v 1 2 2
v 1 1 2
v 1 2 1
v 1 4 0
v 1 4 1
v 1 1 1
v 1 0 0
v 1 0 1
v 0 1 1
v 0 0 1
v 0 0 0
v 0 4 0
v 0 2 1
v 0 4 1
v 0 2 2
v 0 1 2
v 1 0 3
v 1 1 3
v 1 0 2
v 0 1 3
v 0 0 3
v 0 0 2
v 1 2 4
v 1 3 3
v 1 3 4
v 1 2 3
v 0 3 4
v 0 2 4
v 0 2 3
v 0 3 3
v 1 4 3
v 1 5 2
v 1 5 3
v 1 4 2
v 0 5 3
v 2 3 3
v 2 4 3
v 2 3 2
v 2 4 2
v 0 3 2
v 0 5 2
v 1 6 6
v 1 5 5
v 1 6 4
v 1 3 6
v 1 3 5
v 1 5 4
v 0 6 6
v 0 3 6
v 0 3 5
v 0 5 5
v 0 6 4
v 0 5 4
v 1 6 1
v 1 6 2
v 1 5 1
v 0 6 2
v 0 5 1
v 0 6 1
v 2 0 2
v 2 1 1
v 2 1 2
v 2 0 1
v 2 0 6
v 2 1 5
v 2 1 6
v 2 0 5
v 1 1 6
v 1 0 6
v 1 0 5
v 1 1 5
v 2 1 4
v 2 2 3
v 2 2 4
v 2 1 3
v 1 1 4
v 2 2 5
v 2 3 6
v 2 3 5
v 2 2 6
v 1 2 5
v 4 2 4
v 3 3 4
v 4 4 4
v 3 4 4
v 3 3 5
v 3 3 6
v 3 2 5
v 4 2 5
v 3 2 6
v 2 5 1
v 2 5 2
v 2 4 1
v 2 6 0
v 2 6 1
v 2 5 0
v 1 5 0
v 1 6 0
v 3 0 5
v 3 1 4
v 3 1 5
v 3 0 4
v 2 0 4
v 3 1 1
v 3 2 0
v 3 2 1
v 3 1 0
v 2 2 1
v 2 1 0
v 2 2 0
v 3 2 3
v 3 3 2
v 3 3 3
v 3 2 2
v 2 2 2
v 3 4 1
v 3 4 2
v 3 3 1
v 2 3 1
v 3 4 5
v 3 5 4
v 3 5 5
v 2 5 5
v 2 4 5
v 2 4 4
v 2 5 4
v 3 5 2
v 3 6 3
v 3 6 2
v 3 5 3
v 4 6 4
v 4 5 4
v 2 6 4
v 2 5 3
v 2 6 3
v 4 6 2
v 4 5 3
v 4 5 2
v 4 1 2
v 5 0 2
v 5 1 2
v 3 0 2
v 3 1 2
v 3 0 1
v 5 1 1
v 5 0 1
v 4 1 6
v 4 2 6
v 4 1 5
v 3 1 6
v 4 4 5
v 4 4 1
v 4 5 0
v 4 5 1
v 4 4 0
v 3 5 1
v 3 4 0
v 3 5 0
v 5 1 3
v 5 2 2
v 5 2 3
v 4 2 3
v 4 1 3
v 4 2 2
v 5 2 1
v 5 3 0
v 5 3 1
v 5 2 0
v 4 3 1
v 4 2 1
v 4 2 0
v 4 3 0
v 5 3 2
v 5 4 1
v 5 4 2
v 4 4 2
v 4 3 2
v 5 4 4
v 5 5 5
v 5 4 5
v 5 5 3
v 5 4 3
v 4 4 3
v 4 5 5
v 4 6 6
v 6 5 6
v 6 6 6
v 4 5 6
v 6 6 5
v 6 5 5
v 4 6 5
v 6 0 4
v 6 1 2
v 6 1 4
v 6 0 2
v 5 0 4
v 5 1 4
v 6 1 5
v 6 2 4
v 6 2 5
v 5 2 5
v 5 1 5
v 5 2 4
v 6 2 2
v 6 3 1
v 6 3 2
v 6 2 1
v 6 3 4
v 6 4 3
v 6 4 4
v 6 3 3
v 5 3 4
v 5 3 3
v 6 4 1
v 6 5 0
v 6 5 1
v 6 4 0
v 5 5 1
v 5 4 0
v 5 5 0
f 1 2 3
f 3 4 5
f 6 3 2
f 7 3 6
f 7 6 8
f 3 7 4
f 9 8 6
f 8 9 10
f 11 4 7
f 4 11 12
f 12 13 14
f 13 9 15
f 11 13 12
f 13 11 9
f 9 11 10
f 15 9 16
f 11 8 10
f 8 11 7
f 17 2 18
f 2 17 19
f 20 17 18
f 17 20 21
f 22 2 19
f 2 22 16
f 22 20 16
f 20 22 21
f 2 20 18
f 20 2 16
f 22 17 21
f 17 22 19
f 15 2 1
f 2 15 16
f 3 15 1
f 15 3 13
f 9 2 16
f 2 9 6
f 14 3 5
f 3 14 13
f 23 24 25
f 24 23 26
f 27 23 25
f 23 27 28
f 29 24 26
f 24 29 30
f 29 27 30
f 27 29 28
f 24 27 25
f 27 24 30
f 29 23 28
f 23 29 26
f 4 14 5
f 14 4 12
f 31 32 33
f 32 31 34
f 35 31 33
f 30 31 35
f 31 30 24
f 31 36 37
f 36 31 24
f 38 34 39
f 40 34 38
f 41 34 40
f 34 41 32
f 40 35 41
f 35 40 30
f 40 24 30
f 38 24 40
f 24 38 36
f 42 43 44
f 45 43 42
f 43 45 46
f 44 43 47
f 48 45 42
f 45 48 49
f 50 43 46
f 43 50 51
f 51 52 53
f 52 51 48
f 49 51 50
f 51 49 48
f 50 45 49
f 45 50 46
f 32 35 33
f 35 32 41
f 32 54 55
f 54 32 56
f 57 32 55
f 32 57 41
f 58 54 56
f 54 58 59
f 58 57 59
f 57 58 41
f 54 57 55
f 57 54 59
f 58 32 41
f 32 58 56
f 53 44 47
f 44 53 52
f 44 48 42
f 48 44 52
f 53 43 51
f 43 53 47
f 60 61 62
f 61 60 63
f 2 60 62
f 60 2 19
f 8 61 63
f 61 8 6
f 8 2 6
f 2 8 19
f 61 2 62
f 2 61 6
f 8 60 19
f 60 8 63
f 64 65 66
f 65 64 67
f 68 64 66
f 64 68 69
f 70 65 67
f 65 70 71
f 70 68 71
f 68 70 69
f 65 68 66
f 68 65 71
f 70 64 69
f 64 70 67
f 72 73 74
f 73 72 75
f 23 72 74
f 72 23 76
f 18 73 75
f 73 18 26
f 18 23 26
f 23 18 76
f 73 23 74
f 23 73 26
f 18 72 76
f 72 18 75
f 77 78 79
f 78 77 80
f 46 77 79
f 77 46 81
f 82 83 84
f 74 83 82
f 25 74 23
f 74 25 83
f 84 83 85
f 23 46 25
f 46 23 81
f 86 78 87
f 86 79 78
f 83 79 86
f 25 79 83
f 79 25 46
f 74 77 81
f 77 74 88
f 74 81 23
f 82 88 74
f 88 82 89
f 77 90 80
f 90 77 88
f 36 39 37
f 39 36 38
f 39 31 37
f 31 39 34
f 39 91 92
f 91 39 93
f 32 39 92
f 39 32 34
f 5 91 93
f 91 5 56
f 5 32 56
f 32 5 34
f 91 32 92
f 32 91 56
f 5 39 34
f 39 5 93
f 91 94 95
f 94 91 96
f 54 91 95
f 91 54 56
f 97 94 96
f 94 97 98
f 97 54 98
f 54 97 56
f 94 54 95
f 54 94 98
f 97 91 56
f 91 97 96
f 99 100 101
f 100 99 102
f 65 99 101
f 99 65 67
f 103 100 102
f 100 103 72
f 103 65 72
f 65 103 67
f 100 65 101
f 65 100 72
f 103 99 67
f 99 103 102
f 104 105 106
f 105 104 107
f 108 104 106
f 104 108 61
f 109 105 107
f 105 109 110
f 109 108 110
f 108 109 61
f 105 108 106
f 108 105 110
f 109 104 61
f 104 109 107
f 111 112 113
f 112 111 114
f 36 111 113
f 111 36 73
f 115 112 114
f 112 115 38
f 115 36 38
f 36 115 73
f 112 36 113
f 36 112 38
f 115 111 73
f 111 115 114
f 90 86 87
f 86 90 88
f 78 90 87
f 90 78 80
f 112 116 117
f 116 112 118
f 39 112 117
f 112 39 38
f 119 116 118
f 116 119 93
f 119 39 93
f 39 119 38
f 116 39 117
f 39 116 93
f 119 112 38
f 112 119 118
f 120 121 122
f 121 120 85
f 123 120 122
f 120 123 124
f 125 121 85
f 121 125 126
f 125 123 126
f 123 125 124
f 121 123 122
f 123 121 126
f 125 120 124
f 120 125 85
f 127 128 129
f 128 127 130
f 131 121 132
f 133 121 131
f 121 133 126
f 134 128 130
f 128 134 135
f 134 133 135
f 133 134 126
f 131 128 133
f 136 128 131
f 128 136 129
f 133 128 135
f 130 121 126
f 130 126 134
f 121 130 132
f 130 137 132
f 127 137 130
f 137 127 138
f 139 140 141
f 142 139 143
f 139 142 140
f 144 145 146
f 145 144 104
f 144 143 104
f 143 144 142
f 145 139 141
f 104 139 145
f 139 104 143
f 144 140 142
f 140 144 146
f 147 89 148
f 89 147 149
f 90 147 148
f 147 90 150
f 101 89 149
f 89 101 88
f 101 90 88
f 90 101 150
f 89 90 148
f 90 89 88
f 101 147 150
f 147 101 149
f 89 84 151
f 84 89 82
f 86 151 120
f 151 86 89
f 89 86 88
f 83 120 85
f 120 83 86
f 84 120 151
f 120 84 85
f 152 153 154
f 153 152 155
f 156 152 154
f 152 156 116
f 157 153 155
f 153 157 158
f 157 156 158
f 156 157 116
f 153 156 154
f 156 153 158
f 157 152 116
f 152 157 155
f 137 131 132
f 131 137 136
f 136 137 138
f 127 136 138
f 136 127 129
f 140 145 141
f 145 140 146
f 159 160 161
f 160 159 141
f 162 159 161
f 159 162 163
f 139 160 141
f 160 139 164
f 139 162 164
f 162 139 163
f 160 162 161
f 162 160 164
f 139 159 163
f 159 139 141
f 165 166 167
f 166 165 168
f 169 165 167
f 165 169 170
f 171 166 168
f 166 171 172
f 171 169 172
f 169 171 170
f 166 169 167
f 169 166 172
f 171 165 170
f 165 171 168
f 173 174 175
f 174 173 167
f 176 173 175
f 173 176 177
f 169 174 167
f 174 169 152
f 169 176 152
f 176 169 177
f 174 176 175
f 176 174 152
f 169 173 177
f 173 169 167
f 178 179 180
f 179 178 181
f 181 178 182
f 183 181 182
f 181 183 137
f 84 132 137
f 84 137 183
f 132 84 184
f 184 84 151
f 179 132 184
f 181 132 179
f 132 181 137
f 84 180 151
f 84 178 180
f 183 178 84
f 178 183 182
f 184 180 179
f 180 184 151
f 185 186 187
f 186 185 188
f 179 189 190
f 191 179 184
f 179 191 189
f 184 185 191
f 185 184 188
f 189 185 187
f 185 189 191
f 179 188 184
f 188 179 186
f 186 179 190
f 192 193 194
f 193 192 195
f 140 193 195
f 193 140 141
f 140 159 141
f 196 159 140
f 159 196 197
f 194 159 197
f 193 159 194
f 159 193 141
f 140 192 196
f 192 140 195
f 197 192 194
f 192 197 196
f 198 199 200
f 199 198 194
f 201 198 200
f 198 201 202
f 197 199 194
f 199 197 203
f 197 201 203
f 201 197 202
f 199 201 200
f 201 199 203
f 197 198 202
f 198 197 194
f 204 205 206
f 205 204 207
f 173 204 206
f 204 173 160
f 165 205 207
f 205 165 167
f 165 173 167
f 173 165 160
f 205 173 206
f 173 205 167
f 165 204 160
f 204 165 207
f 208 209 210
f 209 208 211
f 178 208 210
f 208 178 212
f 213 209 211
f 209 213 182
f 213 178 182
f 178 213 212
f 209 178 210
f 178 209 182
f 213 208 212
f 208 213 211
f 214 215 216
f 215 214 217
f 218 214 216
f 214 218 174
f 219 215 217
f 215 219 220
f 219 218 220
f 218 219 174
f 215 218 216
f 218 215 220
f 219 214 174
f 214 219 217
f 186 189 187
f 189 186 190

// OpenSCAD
union() {
    translate([0, 0, 0]) cube([1, 1, 1]);
    translate([0, 0, 2]) cube([1, 1, 1]);
    translate([0, 1, 0]) cube([1, 1, 1]);
    translate([0, 1, 1]) cube([1, 1, 1]);
    translate([0, 2, 0]) cube([1, 1, 1]);
    translate([0, 2, 3]) cube([1, 1, 1]);
    translate([0, 3, 0]) cube([1, 1, 1]);
    translate([0, 3, 2]) cube([1, 1, 1]);
    translate([0, 3, 5]) cube([1, 1, 1]);
    translate([0, 4, 2]) cube([1, 1, 1]);
    translate([0, 4, 5]) cube([1, 1, 1]);
    translate([0, 5, 1]) cube([1, 1, 1]);
    translate([0, 5, 4]) cube([1, 1, 1]);
    translate([0, 5, 5]) cube([1, 1, 1]);
    translate([1, 0, 1]) cube([1, 1, 1]);
    translate([1, 0, 5]) cube([1, 1, 1]);
    translate([1, 1, 3]) cube([1, 1, 1]);
    translate([1, 2, 4]) cube([1, 1, 1]);
    translate([1, 3, 2]) cube([1, 1, 1]);
    translate([1, 4, 1]) cube([1, 1, 1]);
    translate([1, 5, 0]) cube([1, 1, 1]);
    translate([2, 0, 4]) cube([1, 1, 1]);
    translate([2, 1, 0]) cube([1, 1, 1]);
    translate([2, 2, 2]) cube([1, 1, 1]);
    translate([2, 2, 4]) cube([1, 1, 1]);
    translate([2, 2, 5]) cube([1, 1, 1]);
    translate([2, 3, 1]) cube([1, 1, 1]);
    translate([2, 4, 4]) cube([1, 1, 1]);
    translate([2, 5, 3]) cube([1, 1, 1]);
    translate([3, 0, 1]) cube([1, 1, 1]);
    translate([3, 1, 5]) cube([1, 1, 1]);
    translate([3, 2, 4]) cube([1, 1, 1]);
    translate([3, 3, 4]) cube([1, 1, 1]);
    translate([3, 4, 0]) cube([1, 1, 1]);
    translate([3, 5, 2]) cube([1, 1, 1]);
    translate([3, 5, 3]) cube([1, 1, 1]);
    translate([4, 0, 1]) cube([1, 1, 1]);
    translate([4, 1, 2]) cube([1, 1, 1]);
    translate([4, 2, 0]) cube([1, 1, 1]);
    translate([4, 3, 1]) cube([1, 1, 1]);
    translate([4, 4, 3]) cube([1, 1, 1]);
    translate([4, 4, 4]) cube([1, 1, 1]);
    translate([4, 5, 5]) cube([1, 1, 1]);
    translate([5, 0, 2]) cube([1, 1, 1]);
    translate([5, 0, 3]) cube([1, 1, 1]);
    translate([5, 1, 4]) cube([1, 1, 1]);
    translate([5, 2, 1]) cube([1, 1, 1]);
    translate([5, 3, 3]) cube([1, 1, 1]);
    translate([5, 4, 0]) cube([1, 1, 1]);
    translate([5, 5, 5]) cube([1, 1, 1]);
}
